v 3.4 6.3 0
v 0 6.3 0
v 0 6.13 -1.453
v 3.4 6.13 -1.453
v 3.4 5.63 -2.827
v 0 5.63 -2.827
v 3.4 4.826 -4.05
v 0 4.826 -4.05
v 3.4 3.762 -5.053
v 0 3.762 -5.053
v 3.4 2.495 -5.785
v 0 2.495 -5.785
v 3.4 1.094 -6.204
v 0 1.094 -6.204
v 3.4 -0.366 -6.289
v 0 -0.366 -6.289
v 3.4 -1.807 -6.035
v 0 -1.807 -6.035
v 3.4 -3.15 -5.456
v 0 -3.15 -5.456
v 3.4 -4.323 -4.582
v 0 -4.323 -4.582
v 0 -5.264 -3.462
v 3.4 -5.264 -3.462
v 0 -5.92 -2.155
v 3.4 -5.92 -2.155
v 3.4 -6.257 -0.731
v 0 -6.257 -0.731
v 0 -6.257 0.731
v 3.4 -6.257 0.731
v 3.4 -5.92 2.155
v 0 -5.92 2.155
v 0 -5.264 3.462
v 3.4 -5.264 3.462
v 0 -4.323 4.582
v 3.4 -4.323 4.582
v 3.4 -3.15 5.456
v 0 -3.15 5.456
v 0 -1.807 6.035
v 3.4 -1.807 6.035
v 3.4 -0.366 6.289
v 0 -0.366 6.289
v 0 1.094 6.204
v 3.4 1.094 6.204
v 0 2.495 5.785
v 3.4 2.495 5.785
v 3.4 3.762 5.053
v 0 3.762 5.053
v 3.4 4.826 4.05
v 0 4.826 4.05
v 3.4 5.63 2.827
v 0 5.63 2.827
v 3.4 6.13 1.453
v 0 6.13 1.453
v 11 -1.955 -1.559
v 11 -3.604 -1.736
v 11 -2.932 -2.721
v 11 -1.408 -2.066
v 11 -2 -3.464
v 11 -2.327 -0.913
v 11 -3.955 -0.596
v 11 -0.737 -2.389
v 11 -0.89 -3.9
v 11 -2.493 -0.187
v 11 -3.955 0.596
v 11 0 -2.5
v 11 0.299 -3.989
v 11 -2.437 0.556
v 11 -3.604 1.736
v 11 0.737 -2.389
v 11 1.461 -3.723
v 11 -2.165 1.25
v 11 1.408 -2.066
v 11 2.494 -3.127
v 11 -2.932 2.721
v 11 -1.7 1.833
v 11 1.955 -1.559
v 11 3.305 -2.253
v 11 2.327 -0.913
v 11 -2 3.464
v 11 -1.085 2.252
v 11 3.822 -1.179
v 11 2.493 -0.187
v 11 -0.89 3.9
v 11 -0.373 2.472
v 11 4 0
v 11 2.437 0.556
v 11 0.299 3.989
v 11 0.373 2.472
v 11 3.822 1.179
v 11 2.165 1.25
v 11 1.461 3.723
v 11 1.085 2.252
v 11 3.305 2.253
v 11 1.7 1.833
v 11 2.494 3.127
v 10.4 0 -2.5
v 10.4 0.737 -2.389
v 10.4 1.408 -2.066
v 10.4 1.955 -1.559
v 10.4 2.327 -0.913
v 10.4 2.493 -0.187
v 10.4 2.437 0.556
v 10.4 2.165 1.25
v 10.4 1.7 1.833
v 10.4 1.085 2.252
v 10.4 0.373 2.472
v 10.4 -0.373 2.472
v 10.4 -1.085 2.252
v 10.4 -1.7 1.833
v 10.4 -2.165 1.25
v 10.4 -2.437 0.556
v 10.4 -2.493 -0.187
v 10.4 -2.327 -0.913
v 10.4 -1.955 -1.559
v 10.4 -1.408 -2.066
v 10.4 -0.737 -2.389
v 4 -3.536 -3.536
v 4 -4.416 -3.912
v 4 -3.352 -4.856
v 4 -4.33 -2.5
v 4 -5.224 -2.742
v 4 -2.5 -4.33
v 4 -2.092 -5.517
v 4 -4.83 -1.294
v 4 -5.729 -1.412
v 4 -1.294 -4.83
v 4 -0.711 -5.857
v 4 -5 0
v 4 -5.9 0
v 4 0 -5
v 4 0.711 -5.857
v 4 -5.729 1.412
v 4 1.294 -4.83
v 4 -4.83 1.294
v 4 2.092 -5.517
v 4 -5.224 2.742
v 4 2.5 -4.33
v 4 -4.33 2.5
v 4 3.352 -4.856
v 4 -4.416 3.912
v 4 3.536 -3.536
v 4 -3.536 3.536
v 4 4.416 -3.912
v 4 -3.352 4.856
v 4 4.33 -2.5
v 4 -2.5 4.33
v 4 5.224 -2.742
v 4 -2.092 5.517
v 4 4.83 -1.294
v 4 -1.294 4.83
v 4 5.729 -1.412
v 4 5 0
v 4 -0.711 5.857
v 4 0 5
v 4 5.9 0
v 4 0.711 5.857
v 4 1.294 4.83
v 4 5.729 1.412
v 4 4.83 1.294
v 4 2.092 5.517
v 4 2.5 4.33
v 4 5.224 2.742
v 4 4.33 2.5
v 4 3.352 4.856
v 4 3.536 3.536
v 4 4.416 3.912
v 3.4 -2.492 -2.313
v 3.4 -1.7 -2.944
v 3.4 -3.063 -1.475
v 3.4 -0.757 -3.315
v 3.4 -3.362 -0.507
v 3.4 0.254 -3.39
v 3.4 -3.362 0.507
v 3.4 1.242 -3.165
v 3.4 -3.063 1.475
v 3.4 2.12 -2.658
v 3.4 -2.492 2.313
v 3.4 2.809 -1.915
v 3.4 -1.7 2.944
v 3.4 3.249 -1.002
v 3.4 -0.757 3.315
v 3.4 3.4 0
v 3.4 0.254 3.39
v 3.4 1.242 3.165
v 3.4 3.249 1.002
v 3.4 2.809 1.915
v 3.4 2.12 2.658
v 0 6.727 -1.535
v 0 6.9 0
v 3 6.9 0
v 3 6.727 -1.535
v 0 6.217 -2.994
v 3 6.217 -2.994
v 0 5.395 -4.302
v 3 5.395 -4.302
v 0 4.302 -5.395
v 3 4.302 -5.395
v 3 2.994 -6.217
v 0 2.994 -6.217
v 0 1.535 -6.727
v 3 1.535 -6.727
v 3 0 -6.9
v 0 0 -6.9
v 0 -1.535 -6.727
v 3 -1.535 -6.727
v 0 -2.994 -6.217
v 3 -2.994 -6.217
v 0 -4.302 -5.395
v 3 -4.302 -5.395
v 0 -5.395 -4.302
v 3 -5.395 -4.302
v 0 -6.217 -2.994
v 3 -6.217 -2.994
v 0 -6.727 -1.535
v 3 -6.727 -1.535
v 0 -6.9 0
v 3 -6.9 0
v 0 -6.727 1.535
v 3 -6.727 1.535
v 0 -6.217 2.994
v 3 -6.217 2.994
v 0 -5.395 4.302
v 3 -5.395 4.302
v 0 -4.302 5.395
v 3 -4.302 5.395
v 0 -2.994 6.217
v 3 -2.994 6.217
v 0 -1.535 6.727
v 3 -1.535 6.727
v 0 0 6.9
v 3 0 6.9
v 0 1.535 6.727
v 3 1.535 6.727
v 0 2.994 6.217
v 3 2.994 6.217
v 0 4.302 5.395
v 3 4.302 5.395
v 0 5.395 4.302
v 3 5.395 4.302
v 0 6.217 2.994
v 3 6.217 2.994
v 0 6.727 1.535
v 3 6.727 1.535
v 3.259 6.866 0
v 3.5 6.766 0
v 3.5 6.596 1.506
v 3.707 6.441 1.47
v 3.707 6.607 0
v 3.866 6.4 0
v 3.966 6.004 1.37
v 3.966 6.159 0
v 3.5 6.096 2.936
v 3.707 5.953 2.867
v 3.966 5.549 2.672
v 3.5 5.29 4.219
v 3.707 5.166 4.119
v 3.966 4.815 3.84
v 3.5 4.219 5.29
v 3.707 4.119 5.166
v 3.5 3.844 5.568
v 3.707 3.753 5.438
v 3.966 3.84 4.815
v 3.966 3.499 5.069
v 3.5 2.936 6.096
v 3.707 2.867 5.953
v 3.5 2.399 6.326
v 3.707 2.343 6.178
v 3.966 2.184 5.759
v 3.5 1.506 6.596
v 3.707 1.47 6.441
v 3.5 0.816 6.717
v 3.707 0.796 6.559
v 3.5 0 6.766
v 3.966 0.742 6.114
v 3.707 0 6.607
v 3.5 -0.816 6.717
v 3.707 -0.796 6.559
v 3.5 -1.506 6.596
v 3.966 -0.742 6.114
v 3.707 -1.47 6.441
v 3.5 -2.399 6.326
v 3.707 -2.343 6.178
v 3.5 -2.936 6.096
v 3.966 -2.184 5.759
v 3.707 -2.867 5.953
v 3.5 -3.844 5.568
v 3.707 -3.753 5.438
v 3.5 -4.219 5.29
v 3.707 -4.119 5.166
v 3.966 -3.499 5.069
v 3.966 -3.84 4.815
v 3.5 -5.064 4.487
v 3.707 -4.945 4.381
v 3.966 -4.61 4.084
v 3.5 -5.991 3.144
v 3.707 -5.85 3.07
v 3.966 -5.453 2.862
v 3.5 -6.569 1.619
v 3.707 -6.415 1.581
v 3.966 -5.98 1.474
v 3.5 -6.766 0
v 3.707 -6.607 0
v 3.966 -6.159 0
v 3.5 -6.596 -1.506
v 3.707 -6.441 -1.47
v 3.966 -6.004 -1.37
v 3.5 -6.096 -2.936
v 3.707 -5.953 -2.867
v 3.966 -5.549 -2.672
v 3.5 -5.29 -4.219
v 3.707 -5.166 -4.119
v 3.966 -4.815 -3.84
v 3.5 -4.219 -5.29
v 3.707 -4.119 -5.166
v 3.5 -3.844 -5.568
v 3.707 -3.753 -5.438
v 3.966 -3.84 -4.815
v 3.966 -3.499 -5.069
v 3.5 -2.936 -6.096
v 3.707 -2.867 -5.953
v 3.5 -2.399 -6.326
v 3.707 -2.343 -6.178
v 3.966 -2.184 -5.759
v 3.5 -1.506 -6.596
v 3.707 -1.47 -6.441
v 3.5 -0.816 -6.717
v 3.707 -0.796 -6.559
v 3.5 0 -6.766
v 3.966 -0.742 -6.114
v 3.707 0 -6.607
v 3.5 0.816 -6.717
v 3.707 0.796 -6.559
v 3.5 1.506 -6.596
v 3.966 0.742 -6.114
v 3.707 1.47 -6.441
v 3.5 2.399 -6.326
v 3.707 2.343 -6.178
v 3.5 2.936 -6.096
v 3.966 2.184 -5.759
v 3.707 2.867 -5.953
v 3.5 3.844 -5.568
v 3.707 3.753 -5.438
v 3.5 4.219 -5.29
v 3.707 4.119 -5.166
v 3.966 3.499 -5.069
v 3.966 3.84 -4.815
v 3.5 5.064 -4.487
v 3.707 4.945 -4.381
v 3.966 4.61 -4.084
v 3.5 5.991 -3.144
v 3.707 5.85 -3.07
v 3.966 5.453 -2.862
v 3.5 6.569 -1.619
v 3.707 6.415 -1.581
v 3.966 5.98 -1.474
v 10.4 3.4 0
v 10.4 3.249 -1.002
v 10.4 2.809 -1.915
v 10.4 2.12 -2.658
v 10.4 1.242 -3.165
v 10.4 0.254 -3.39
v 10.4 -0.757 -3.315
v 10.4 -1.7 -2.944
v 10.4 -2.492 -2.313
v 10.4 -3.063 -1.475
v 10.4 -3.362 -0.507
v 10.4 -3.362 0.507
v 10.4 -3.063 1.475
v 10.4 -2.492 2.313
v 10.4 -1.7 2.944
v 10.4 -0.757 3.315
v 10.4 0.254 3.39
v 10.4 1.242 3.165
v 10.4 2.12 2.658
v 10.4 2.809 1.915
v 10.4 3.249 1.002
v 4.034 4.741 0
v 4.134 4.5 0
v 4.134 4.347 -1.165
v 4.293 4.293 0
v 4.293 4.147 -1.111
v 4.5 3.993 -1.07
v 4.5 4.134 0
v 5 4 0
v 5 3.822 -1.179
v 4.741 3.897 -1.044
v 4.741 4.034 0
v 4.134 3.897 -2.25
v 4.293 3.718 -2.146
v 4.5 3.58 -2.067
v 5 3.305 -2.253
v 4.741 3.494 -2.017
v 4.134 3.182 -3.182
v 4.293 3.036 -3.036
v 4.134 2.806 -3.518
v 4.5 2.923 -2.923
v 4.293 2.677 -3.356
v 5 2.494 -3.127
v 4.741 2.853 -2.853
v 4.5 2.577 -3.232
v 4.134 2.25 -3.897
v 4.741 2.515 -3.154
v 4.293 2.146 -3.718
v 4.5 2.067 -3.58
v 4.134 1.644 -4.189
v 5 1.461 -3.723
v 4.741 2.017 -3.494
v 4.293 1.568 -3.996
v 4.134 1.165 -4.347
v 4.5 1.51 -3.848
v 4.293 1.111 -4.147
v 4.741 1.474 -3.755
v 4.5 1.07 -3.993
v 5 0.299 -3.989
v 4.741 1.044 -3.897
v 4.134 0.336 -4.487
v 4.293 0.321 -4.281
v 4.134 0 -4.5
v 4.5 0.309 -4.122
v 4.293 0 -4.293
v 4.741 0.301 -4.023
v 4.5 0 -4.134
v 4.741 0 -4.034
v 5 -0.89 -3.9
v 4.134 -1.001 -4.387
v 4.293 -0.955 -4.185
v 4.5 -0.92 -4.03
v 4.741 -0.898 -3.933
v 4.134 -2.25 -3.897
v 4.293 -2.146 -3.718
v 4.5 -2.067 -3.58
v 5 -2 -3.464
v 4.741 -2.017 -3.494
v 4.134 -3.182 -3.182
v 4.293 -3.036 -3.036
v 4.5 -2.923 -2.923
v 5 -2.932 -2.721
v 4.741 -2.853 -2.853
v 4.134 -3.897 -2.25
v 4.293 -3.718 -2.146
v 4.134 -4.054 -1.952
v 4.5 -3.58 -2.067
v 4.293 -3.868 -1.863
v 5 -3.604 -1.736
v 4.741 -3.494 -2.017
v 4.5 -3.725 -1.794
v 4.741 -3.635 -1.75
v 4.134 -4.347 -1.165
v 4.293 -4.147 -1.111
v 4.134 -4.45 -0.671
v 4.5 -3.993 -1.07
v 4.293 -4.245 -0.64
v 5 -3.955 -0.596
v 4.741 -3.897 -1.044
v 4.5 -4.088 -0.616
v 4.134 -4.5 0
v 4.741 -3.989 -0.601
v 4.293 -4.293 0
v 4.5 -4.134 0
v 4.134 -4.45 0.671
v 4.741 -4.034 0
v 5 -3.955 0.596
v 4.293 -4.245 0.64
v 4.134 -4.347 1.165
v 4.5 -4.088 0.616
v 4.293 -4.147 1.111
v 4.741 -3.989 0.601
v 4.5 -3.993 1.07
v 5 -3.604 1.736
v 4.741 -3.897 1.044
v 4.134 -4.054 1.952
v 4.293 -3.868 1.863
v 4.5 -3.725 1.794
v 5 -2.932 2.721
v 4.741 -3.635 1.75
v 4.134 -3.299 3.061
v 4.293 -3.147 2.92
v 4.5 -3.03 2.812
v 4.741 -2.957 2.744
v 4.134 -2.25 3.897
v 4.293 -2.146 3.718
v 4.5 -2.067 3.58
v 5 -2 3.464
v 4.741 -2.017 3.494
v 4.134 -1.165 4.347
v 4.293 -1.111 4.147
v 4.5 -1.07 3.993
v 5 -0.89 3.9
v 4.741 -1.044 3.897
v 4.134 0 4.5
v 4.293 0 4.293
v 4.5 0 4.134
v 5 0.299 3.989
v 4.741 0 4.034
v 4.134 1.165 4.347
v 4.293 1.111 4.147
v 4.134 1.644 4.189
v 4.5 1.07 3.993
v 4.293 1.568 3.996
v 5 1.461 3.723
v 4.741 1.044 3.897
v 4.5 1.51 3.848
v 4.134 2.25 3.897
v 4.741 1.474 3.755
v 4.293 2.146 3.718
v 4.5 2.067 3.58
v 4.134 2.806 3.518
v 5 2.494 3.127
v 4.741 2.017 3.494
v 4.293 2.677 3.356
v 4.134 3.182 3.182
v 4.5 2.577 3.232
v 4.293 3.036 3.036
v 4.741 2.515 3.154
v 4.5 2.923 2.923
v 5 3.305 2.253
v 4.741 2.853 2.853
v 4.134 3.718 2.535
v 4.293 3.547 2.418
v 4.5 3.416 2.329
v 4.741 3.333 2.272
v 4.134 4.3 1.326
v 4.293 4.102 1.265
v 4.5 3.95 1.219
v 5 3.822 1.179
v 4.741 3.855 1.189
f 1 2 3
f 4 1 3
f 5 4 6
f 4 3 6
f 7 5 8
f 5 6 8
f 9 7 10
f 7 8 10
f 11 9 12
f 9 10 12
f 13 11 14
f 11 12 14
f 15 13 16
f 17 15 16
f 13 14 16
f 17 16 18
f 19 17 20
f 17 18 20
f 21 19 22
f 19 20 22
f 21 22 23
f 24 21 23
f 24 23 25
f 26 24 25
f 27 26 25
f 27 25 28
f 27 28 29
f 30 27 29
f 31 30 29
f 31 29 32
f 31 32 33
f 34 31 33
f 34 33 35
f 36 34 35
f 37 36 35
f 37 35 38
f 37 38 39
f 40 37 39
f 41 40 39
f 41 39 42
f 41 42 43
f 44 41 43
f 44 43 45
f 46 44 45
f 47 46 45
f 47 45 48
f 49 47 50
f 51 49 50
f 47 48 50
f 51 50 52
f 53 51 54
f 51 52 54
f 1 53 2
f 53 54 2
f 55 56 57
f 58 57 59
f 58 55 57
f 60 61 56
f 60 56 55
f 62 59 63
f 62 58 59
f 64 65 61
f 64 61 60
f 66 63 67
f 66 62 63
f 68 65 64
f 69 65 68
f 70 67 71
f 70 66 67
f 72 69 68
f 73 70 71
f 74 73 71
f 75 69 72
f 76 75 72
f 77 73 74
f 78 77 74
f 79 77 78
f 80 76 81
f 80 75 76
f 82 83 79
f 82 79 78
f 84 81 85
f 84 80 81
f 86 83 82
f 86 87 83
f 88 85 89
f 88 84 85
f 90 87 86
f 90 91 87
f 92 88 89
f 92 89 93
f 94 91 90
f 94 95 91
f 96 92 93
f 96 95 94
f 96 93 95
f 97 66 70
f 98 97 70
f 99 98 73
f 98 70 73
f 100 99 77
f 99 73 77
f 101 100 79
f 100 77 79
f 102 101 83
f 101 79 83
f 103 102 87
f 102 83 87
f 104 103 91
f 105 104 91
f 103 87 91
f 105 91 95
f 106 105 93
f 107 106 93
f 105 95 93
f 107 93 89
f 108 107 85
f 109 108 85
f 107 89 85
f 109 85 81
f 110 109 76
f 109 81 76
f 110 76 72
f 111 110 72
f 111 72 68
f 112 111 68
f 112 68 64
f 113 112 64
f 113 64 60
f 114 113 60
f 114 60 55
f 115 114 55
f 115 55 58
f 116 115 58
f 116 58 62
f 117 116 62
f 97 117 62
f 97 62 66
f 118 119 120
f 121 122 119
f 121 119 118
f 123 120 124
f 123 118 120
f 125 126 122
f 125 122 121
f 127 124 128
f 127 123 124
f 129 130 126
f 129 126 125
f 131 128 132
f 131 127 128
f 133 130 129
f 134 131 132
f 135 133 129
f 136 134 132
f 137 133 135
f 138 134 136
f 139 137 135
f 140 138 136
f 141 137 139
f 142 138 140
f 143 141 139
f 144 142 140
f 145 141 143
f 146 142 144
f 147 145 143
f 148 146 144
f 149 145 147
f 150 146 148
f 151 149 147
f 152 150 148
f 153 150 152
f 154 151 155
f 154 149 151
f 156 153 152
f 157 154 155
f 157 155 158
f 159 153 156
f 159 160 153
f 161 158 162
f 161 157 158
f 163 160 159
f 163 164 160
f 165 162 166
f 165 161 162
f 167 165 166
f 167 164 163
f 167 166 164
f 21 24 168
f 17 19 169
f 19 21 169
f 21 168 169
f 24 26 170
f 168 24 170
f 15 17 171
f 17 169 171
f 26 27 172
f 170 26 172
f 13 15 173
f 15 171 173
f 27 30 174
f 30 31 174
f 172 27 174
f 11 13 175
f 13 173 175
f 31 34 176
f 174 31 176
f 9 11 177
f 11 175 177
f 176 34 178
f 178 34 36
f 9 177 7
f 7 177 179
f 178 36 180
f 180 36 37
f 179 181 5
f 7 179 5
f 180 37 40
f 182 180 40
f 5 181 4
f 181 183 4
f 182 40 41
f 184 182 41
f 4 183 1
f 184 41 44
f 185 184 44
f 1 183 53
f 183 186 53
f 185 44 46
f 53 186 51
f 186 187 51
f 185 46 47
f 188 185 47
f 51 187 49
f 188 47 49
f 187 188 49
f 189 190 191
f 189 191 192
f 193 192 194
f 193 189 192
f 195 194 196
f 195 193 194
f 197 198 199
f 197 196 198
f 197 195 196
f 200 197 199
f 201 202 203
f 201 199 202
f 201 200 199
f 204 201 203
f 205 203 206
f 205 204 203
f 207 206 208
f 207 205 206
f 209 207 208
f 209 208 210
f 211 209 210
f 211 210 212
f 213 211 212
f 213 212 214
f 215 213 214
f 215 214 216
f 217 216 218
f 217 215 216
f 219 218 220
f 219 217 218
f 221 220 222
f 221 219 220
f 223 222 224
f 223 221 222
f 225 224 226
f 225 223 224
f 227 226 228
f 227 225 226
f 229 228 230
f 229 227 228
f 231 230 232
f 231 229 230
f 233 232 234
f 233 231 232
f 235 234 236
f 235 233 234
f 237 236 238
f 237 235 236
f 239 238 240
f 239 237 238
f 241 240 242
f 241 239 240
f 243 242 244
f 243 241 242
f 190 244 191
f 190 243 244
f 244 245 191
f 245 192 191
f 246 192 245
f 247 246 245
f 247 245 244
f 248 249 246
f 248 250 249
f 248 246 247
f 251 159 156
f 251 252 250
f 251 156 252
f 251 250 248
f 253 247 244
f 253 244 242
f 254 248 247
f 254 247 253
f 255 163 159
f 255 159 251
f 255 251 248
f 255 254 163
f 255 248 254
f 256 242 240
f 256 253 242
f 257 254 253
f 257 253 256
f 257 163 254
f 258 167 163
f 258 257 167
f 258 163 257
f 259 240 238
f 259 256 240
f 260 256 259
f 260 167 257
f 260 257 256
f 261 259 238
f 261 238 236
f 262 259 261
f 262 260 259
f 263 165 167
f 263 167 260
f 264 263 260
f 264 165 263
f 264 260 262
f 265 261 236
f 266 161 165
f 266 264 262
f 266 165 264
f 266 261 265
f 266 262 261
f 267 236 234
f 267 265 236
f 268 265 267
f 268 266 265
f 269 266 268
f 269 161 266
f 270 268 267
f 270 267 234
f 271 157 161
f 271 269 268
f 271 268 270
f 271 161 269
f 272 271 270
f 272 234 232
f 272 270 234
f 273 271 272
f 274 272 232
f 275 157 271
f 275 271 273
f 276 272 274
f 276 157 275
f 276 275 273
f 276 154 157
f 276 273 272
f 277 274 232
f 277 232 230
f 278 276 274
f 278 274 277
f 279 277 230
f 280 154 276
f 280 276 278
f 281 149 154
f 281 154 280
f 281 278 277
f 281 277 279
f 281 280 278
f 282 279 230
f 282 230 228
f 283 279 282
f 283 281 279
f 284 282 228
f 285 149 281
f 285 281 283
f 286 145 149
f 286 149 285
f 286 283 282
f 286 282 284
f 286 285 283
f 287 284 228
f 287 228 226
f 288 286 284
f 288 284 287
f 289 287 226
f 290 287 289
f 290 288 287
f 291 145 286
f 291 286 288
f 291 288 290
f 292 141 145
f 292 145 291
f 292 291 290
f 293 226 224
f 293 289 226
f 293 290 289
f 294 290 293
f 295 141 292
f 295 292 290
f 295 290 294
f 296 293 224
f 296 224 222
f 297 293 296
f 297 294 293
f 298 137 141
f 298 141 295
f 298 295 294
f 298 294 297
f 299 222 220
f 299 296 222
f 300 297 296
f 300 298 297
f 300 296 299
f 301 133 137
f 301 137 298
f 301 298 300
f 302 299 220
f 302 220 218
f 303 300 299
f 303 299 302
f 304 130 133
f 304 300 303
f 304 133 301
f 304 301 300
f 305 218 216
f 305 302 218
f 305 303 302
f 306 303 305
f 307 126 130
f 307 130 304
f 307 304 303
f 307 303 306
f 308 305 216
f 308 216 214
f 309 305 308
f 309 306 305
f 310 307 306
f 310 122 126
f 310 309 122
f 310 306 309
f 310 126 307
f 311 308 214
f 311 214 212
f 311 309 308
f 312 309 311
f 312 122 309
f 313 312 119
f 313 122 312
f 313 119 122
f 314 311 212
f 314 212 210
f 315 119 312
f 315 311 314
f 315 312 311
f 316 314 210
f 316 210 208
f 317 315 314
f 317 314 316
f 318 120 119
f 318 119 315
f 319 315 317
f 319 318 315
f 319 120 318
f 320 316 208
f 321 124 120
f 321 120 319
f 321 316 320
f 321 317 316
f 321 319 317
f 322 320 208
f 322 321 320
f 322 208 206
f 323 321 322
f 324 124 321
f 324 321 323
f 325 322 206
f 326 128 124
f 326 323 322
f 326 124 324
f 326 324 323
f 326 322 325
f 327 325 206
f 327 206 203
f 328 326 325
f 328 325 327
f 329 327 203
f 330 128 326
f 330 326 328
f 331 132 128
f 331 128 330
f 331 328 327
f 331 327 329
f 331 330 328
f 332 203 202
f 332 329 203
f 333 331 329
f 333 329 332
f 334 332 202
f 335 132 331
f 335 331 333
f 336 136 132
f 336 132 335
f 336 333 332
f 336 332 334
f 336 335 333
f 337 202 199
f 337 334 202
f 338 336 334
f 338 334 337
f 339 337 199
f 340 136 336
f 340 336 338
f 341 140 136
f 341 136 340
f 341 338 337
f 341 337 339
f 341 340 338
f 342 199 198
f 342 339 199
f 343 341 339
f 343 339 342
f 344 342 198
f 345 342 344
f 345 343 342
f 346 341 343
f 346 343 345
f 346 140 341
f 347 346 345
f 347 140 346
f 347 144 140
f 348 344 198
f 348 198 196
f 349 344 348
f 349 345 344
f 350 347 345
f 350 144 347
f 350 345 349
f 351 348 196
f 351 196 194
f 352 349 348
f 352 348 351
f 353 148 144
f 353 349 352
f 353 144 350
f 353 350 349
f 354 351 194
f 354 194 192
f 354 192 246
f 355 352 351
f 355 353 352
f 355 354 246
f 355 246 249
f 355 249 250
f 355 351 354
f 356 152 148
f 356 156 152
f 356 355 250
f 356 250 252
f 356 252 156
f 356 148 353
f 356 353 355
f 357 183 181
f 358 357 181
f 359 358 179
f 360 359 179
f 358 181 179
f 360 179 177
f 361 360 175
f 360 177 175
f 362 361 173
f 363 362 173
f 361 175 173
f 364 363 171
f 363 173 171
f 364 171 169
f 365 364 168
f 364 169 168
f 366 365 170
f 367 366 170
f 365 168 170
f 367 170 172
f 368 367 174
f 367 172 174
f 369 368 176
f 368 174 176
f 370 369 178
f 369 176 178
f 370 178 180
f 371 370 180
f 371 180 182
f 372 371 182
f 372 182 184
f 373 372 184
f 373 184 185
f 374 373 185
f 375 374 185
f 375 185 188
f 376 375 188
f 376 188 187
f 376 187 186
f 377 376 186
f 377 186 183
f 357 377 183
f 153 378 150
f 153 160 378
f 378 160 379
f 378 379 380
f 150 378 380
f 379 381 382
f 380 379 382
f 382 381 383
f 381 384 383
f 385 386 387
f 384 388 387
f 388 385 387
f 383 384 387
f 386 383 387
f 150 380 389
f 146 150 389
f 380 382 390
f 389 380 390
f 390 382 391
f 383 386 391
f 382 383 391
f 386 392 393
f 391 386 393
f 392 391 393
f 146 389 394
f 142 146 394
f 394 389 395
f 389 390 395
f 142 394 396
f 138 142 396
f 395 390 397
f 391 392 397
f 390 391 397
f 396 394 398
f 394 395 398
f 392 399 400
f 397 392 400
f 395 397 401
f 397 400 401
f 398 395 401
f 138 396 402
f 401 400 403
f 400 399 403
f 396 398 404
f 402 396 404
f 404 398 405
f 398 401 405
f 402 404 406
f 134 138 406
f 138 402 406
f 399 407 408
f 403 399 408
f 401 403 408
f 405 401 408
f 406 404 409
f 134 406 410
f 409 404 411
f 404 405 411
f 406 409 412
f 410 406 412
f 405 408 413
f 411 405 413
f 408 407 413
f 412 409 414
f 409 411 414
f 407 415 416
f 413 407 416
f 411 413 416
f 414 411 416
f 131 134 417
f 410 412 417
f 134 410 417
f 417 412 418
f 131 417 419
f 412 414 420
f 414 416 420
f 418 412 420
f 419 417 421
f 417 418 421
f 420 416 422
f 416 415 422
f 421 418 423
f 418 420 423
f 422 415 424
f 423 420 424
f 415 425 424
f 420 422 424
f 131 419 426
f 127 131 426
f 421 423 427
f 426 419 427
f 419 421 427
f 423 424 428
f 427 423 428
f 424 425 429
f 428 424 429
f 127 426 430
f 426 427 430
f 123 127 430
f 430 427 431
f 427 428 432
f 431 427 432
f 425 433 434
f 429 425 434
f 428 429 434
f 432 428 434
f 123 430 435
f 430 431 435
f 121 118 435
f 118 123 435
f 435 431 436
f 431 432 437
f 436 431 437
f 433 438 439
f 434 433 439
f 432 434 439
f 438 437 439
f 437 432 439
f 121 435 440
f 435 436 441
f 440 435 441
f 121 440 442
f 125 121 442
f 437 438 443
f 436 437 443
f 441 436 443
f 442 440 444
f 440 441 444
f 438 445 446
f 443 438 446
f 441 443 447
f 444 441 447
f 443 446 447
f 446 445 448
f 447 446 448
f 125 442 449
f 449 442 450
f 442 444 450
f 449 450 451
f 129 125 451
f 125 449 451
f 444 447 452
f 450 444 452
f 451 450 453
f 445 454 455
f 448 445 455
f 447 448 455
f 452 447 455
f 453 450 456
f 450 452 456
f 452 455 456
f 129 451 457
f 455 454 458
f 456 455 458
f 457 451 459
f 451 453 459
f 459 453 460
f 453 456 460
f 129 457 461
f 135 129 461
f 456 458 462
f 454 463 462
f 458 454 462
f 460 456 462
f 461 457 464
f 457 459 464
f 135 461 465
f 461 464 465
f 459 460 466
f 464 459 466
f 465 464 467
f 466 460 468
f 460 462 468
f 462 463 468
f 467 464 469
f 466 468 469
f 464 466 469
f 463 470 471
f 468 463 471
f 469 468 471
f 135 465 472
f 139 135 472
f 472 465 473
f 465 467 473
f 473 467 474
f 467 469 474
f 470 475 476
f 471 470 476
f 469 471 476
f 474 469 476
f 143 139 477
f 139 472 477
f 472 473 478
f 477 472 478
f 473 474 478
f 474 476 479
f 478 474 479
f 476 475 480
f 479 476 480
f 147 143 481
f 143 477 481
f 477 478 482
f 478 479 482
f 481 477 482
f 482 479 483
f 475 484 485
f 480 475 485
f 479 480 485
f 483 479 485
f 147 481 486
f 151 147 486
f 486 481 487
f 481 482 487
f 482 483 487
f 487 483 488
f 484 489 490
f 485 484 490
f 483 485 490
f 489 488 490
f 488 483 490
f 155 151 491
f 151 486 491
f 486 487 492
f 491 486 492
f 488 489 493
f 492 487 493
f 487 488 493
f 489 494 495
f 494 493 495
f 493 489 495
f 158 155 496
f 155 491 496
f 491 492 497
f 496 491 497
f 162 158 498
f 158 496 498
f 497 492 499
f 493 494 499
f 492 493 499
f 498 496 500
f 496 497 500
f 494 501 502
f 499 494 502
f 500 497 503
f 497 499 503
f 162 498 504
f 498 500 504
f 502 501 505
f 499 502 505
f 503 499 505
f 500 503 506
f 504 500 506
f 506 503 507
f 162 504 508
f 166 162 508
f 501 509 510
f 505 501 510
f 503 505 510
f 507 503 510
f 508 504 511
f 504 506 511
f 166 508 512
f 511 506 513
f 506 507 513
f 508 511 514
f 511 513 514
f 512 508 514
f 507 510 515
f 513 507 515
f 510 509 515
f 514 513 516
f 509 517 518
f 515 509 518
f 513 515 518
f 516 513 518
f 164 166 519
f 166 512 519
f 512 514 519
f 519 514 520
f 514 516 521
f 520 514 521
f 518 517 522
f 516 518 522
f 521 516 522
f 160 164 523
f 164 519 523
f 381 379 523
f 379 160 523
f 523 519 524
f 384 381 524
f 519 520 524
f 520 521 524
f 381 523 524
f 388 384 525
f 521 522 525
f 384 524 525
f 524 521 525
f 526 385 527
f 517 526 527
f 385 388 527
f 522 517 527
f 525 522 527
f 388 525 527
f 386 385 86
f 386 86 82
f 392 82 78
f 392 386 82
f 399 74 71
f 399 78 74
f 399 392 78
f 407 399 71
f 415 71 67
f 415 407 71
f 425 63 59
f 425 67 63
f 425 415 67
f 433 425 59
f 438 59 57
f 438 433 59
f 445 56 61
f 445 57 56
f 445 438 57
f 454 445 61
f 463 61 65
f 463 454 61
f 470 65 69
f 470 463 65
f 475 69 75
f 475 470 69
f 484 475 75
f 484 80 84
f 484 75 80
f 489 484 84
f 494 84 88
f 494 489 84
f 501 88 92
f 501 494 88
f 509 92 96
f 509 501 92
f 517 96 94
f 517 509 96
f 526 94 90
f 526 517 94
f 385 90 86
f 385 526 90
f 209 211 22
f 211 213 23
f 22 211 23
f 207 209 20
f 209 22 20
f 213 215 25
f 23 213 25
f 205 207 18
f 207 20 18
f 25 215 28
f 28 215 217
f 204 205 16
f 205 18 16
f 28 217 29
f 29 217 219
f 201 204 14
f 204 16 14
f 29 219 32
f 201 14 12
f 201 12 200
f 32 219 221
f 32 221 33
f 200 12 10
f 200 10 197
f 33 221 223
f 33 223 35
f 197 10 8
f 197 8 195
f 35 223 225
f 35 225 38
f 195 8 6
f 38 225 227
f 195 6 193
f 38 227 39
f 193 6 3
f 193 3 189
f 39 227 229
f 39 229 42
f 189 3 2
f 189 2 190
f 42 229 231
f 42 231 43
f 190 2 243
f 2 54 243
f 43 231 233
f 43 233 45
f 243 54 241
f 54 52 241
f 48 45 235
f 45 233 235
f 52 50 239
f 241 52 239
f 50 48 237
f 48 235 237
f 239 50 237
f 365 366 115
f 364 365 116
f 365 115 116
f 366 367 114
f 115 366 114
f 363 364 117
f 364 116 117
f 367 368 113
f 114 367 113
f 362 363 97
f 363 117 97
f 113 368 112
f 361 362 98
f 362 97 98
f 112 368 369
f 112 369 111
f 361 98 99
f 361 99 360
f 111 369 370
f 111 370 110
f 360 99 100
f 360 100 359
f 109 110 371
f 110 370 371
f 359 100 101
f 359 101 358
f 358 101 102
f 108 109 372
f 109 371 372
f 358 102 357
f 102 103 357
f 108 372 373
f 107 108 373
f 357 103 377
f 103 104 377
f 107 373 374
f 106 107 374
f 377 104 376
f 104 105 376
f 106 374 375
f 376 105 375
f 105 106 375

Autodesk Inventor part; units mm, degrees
ref_plane "YZ Plane" through (0, 0, 0) normal (1, 0, 0) x (0, 1, 0)
ref_plane "XZ Plane" through (0, 0, 0) normal (0, 1, 0) x (-1, 0, 0)
ref_plane "XY Plane" through (0, 0, 0) normal (0, 0, 1) x (1, 0, 0)
sketch "スケッチ1" plane through (0, 0, 0) normal (0, 0, 1) x (1, 0, 0)
  line L0 (0, 0) -> (11, 0)
  line L1 (11, 0) -> (11, 4)
  line L2 (11, 4) -> (4, 4)
  line L3 (4, 4) -> (4, 6.9)
  line L4 (4, 6.9) -> (0, 6.9)
  line L5 (0, 6.9) -> (0, 0)
  dimension "d9" = 8
  dimension "d10" = 13.8
  dimension "d11" = 4
  dimension "d12" = 7
revolve "回転1" add sketch "スケッチ1" angle 360 about axis through (0, 0, 0) along (1, 0, 0)
shell "Shell1" thickness 0.6 removed faces 1 at (0, 1.1832, -1.6579)
sketch "Sketch2" plane through (11, 0, 0) normal (1, 0, 0) x (0, 0, -1)
  circle A0 centre (0, 0) radius 2.5
  dimension "d14" = 5
extrude "Extrusion1" cut sketch "Sketch2" against normal blind 11
fillet "Fillet1" radius 1 2 edges at (4, -6.9, 0) (4, -4, 0)
properties material "Stainless Steel"
